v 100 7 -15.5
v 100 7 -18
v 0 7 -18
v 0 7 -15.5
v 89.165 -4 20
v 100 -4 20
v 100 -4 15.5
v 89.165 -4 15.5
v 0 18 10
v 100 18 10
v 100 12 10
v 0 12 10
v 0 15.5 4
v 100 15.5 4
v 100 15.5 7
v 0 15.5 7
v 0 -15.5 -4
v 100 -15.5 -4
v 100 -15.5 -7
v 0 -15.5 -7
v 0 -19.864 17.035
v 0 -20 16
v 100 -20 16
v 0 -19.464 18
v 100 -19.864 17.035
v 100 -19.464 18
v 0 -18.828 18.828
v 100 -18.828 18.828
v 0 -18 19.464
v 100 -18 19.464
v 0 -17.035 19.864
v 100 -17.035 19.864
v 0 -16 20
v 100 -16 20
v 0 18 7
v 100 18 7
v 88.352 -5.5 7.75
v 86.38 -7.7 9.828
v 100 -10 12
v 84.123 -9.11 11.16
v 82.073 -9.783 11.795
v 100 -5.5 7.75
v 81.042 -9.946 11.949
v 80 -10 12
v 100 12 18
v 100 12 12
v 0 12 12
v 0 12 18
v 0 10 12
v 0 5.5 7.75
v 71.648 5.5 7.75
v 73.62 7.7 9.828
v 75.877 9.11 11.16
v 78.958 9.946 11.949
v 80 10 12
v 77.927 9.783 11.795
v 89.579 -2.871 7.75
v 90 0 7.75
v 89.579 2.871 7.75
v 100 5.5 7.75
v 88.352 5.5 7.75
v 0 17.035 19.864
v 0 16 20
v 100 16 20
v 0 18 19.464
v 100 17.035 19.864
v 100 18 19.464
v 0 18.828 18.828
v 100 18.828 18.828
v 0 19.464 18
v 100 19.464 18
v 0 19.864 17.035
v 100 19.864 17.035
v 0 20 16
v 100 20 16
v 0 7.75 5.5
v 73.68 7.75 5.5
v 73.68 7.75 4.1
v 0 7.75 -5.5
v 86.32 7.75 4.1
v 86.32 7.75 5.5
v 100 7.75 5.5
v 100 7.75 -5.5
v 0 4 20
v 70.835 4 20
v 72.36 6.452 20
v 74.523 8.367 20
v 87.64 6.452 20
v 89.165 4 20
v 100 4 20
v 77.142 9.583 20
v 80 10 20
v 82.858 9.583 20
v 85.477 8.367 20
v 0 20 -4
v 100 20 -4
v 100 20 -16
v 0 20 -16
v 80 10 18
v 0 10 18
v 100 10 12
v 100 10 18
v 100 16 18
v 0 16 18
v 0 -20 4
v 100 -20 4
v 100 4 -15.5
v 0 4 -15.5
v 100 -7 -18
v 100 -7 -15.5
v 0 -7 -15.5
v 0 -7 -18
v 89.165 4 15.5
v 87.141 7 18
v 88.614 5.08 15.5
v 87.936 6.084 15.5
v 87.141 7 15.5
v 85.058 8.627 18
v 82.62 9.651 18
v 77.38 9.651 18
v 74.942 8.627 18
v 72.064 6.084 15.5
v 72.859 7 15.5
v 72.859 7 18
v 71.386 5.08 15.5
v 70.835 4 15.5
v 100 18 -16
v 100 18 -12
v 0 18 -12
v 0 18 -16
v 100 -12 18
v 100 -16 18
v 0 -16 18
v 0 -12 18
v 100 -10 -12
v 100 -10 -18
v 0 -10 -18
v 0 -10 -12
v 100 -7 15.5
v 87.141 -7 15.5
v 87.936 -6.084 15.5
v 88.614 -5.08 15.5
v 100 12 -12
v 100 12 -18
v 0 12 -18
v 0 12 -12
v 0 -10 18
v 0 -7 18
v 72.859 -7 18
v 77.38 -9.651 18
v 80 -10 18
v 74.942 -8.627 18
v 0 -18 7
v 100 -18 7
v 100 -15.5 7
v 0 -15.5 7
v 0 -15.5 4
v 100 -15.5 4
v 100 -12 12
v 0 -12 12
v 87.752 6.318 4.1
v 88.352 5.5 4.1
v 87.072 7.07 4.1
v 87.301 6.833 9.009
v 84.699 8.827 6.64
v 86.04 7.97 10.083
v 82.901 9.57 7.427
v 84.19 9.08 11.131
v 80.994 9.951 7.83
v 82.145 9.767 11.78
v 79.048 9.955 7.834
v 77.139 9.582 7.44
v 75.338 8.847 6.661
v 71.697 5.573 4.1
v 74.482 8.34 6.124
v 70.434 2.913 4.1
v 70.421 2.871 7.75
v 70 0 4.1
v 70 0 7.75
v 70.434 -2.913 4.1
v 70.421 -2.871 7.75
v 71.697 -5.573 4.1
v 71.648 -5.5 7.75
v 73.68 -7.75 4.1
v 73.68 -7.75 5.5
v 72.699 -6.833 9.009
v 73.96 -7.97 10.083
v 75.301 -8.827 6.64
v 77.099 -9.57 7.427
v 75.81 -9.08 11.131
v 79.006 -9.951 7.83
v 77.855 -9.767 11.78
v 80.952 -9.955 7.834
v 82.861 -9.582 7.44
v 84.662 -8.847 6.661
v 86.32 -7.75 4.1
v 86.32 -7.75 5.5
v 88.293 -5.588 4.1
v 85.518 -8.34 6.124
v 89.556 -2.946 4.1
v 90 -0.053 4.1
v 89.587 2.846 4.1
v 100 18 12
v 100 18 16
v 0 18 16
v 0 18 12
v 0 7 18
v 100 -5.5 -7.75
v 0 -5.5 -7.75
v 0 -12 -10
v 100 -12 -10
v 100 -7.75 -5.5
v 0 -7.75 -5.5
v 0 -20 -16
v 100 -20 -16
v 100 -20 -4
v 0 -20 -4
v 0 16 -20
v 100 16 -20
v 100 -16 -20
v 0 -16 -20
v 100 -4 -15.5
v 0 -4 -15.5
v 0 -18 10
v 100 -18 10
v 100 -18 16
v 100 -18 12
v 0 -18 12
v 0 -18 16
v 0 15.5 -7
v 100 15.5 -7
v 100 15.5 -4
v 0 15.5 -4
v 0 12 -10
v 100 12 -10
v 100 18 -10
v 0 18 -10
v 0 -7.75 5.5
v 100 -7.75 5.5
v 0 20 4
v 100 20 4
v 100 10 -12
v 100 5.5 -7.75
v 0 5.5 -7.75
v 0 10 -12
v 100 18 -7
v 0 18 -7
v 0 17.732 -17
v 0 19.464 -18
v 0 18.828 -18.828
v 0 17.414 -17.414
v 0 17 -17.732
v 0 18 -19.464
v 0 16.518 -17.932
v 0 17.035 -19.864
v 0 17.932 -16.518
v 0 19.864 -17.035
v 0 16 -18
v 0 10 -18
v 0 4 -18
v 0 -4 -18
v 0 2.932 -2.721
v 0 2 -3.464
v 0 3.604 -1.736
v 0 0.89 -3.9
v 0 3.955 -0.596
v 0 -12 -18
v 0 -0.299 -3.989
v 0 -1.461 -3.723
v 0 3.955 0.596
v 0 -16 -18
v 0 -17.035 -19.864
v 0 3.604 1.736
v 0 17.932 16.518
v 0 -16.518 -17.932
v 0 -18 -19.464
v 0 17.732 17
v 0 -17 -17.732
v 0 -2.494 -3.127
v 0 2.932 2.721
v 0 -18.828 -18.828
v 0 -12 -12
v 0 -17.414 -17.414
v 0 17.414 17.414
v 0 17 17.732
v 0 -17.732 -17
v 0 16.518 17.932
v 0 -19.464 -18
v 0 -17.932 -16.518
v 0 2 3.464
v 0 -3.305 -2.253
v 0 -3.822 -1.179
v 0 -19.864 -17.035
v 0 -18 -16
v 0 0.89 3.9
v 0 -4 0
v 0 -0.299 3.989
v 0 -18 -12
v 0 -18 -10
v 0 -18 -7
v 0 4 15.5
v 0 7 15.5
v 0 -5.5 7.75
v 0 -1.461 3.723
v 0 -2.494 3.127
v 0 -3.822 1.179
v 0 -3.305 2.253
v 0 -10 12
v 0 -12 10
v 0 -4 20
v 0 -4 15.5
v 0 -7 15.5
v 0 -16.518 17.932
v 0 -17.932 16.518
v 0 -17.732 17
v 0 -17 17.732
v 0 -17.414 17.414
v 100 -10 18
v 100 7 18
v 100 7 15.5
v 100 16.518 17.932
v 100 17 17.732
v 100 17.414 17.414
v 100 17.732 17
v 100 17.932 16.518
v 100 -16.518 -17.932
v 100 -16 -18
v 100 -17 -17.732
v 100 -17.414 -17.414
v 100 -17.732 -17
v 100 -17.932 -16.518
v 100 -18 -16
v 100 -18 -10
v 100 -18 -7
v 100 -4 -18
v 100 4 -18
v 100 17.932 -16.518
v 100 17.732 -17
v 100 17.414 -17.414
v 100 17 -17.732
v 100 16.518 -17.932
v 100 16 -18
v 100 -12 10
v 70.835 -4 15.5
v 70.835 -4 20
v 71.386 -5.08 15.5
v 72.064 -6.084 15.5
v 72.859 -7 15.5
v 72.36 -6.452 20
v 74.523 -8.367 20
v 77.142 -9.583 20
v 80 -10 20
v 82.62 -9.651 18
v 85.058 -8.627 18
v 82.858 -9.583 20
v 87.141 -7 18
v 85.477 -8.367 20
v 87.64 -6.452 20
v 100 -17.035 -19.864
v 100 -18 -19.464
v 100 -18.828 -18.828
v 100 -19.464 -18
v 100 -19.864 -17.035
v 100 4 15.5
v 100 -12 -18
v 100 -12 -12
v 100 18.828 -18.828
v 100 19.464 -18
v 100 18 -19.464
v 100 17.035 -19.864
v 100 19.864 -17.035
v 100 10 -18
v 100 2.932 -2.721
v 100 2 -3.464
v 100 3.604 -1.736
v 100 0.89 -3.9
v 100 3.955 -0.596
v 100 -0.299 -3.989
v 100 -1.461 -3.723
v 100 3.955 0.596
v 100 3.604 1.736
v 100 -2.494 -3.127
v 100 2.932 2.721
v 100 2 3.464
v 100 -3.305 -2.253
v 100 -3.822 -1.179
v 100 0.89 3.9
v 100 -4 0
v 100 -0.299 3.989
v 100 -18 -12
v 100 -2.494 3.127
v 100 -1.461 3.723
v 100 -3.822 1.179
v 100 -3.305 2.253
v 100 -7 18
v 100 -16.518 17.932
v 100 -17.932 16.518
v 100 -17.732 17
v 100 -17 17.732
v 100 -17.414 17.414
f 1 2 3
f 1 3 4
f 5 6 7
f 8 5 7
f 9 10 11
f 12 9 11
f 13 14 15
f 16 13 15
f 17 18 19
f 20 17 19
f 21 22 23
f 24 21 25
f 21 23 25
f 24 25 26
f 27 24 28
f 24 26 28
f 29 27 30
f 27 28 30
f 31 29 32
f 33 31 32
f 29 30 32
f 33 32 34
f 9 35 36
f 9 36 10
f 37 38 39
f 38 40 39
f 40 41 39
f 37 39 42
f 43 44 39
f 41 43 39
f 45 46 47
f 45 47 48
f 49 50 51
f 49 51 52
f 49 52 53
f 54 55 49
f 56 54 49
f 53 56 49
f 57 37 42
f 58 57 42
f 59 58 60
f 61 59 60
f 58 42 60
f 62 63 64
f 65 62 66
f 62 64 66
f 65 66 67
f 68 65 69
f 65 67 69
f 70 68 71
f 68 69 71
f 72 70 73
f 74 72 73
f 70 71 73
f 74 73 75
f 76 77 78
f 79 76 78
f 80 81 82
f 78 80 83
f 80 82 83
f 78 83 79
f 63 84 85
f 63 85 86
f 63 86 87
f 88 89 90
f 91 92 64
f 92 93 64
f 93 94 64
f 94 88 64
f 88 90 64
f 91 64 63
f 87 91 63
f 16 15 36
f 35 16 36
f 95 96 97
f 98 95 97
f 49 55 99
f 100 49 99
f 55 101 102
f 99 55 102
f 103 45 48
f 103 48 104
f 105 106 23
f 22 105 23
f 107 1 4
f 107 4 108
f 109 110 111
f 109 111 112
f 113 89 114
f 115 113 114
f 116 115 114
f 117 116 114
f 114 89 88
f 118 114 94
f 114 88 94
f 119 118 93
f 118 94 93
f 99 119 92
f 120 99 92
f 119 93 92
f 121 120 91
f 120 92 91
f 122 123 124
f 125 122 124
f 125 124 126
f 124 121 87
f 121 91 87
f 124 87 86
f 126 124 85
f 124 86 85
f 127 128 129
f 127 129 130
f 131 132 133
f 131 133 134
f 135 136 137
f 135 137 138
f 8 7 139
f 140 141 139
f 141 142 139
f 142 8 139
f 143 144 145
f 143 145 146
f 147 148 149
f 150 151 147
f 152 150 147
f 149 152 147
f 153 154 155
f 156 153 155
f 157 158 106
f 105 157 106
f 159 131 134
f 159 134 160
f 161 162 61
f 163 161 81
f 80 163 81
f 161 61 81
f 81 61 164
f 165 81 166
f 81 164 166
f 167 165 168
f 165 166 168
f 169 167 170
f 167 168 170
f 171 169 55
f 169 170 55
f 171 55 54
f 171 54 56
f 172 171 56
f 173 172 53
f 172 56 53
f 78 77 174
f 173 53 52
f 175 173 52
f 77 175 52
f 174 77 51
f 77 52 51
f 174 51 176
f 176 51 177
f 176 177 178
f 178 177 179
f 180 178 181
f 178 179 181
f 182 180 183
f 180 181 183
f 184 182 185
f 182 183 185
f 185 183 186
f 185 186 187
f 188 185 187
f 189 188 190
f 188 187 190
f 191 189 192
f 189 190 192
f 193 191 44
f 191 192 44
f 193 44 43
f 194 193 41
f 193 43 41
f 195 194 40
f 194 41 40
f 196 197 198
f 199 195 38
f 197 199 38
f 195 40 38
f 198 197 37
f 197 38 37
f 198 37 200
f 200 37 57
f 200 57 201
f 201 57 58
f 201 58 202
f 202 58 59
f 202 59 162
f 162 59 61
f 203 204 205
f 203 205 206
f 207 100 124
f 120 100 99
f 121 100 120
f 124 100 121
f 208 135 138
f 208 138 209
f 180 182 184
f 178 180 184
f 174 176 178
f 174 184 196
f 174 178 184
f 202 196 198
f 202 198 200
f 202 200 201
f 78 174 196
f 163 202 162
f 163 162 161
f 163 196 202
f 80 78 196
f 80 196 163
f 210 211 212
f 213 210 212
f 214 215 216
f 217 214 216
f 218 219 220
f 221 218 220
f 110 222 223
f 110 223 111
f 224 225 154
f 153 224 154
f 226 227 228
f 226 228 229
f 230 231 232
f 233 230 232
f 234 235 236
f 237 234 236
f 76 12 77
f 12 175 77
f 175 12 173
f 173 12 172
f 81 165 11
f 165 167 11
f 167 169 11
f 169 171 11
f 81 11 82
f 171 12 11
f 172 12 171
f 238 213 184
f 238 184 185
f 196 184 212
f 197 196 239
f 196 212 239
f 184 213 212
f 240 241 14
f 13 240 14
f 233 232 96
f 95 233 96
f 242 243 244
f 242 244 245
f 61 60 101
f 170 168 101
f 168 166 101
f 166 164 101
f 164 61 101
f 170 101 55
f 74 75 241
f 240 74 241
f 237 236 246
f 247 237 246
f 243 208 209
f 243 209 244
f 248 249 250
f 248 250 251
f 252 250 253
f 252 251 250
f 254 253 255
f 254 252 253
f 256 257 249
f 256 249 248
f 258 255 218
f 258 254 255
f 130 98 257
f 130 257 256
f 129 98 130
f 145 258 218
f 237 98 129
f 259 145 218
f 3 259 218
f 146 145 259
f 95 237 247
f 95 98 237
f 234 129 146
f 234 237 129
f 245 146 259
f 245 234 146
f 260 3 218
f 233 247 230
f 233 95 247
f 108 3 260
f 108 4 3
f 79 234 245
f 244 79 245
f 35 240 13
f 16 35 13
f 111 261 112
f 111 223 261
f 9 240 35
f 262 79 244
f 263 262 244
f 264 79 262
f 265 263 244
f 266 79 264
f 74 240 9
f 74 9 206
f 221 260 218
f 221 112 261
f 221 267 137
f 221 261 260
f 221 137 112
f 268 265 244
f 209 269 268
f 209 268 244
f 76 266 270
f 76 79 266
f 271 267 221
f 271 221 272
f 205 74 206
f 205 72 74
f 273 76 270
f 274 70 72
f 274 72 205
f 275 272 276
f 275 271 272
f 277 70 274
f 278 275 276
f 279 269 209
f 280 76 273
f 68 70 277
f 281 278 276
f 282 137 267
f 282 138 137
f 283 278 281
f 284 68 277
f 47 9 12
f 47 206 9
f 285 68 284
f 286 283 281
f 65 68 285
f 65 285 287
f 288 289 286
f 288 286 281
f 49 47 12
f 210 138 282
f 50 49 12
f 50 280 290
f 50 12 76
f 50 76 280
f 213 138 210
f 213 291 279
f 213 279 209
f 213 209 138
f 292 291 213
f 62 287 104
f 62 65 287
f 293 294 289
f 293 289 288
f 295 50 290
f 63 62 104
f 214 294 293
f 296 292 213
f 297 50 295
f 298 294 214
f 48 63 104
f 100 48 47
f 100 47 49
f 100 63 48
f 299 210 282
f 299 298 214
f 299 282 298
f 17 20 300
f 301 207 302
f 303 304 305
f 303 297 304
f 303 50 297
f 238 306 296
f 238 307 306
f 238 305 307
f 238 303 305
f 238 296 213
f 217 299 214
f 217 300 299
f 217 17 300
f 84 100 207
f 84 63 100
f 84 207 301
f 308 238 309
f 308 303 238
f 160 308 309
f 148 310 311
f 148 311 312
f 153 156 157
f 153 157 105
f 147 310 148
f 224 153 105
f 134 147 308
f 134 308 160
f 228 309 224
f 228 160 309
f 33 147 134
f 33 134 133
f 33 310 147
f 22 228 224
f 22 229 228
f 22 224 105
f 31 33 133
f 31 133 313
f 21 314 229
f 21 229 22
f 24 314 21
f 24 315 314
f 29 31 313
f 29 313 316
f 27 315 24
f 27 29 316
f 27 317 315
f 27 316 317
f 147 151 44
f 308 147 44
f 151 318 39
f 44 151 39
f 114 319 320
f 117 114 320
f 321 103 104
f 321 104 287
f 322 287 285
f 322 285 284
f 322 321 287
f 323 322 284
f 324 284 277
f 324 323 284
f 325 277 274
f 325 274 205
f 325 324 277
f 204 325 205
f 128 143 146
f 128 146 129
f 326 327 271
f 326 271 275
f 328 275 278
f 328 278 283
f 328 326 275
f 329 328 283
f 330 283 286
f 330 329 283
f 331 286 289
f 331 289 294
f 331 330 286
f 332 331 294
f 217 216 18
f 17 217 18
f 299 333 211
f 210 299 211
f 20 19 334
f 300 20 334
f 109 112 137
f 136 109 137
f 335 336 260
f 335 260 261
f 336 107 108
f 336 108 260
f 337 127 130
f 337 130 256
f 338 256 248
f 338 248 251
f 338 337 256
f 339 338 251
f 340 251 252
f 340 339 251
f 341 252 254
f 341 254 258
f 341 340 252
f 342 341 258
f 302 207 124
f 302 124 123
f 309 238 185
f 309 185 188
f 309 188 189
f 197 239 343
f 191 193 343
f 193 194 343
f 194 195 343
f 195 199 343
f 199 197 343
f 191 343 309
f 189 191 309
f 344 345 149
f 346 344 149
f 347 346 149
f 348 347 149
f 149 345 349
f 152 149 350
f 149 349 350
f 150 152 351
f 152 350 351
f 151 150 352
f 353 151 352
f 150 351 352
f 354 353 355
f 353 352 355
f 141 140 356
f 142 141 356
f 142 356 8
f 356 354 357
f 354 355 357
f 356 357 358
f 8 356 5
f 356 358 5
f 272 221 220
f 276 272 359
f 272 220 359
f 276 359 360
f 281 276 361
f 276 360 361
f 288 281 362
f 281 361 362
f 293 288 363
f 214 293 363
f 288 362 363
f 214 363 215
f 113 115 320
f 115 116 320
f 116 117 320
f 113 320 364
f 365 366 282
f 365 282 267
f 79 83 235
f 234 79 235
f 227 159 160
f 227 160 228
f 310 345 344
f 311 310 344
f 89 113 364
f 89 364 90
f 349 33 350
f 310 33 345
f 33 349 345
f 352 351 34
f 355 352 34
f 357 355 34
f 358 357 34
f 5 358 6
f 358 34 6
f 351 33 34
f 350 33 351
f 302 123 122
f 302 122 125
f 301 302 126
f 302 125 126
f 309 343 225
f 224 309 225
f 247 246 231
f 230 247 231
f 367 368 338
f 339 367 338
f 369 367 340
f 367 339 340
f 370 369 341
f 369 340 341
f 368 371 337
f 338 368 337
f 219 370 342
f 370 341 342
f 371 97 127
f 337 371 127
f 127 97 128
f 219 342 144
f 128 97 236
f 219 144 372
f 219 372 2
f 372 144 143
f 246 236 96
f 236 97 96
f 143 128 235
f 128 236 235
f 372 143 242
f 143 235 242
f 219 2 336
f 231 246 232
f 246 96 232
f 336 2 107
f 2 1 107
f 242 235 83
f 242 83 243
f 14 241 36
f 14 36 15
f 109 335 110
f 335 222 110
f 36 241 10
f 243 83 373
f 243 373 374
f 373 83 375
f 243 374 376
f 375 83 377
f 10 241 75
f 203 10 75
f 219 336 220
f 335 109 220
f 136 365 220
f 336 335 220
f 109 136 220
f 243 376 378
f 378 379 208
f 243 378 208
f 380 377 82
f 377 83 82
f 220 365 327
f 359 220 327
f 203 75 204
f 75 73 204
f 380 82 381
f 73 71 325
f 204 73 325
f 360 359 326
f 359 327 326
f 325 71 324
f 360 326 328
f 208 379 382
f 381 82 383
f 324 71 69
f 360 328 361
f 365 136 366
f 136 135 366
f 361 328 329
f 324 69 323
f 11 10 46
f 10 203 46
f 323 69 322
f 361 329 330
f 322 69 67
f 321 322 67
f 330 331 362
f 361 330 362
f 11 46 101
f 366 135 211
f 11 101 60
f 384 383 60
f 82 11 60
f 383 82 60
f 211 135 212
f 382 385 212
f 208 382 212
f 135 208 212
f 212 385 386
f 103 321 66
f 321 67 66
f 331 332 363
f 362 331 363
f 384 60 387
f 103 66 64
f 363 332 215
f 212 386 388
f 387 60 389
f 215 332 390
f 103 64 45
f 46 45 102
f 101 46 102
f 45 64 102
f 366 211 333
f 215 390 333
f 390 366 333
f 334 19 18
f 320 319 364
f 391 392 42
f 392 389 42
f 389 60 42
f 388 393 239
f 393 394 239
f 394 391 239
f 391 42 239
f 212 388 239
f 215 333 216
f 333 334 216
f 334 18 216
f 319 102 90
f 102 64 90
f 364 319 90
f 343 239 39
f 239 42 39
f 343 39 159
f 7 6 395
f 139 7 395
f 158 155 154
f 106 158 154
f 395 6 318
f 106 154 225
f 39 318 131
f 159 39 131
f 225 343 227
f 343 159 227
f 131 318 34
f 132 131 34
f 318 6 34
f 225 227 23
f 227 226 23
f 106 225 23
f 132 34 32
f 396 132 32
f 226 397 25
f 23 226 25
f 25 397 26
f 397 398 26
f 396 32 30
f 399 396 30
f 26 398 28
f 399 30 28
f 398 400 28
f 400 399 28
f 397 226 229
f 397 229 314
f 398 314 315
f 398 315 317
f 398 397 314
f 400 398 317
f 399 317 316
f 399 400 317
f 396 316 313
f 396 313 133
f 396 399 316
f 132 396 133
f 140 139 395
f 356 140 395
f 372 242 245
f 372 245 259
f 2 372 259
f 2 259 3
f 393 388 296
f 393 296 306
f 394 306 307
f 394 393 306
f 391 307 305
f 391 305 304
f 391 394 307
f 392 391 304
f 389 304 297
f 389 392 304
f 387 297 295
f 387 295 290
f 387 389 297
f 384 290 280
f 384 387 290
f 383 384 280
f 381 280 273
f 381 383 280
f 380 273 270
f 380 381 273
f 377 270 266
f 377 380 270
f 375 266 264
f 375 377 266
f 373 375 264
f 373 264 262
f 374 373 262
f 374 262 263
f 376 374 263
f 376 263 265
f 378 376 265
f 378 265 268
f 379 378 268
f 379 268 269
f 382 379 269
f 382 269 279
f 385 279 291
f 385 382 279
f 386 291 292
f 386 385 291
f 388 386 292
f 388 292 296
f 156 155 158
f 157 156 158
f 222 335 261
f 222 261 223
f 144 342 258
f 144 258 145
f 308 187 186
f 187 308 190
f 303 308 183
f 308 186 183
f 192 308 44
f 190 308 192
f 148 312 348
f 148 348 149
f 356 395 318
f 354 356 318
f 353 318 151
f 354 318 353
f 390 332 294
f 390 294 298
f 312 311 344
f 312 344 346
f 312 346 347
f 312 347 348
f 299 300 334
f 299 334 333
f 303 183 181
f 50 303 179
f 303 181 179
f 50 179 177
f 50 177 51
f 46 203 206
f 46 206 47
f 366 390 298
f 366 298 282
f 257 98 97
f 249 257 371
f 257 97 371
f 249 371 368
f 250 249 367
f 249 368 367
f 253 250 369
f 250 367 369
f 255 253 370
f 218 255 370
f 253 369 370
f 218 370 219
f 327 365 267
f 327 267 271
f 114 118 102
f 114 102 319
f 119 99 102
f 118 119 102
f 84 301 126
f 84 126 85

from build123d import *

# Parameters (mm, degrees)
SKIZZE11_R                     = 4
STRUKTURBAUTEIL1_DEPTH         = 100
SKIZZE2_R                      = 10
SCHNITT_LINEAR_AUSTRAGEN_DEPTH = 15.9


with BuildPart() as part:
    # Skizze11 → Strukturbauteil1 (new body)
    with BuildSketch(Plane(origin=(100, 0, 0), x_dir=(0, -1, 0), z_dir=(-1, 0, 0))):
        with BuildLine():
            Line((16, 20), (4, 20))
            Line((4, 20), (4, 15.5))
            Line((4, 15.5), (7, 15.5))
            Line((7, 15.5), (7, 18))
            Line((7, 18), (10, 18))
            Line((10, 18), (10, 12))
            Line((10, 12), (5.5, 7.75))
            Line((5.5, 7.75), (-5.5, 7.75))
            Line((-5.5, 7.75), (-10, 12))
            Line((-10, 12), (-10, 18))
            Line((-10, 18), (-7, 18))
            Line((-7, 18), (-7, 15.5))
            Line((-7, 15.5), (-4, 15.5))
            Line((-4, 15.5), (-4, 20))
            Line((-4, 20), (-16, 20))
            ThreePointArc((-16, 20), (-18.828427125, 18.828427125), (-20, 16))
            Line((-20, 16), (-20, 4))
            Line((-20, 4), (-15.5, 4))
            Line((-15.5, 4), (-15.5, 7))
            Line((-15.5, 7), (-18, 7))
            Line((-18, 7), (-18, 10))
            Line((-18, 10), (-12, 10))
            Line((-12, 10), (-7.75, 5.5))
            Line((-7.75, 5.5), (-7.75, -5.5))
            Line((-7.75, -5.5), (-12, -10))
            Line((-12, -10), (-18, -10))
            Line((-18, -10), (-18, -7))
            Line((-18, -7), (-15.5, -7))
            Line((-15.5, -7), (-15.5, -4))
            Line((-15.5, -4), (-20, -4))
            Line((-20, -4), (-20, -16))
            ThreePointArc((-20, -16), (-18.828427125, -18.828427125), (-16, -20))
            Line((-16, -20), (16, -20))
            ThreePointArc((16, -20), (18.828427125, -18.828427125), (20, -16))
            Line((20, -16), (20, -4))
            Line((20, -4), (15.5, -4))
            Line((15.5, -4), (15.5, -7))
            Line((15.5, -7), (18, -7))
            Line((18, -7), (18, -10))
            Line((18, -10), (12, -10))
            Line((12, -10), (7.75, -5.5))
            Line((7.75, -5.5), (7.75, 5.5))
            Line((7.75, 5.5), (12, 10))
            Line((12, 10), (18, 10))
            Line((18, 10), (18, 7))
            Line((18, 7), (15.5, 7))
            Line((15.5, 7), (15.5, 4))
            Line((15.5, 4), (20, 4))
            Line((20, 4), (20, 16))
            ThreePointArc((20, 16), (18.828427125, 18.828427125), (16, 20))
        make_face()
        Circle(SKIZZE11_R, mode=Mode.SUBTRACT)
        with BuildLine():
            Line((12, 18), (12, 12))
            Line((12, 12), (18, 12))
            Line((18, 12), (18, 16))
            ThreePointArc((18, 16), (17.414213562, 17.414213562), (16, 18))
            Line((16, 18), (12, 18))
        make_face(mode=Mode.SUBTRACT)
        with BuildLine():
            Line((-18, 12), (-12, 12))
            Line((-12, 12), (-12, 18))
            Line((-12, 18), (-16, 18))
            ThreePointArc((-16, 18), (-17.414213562, 17.414213562), (-18, 16))
            Line((-18, 16), (-18, 12))
        make_face(mode=Mode.SUBTRACT)
        Polygon((-4, -18), (4, -18), (4, -15.5), (7, -15.5), (7, -18), (10, -18), (10, -12), (5.5, -7.75), (-5.5, -7.75), (-10, -12), (-10, -18), (-7, -18), (-7, -15.5), (-4, -15.5), align=None, mode=Mode.SUBTRACT)
        with BuildLine():
            Line((18, -12), (12, -12))
            Line((12, -12), (12, -18))
            Line((12, -18), (16, -18))
            ThreePointArc((16, -18), (17.414213562, -17.414213562), (18, -16))
            Line((18, -16), (18, -12))
        make_face(mode=Mode.SUBTRACT)
        with BuildLine():
            Line((-12, -18), (-12, -12))
            Line((-12, -12), (-18, -12))
            Line((-18, -12), (-18, -16))
            ThreePointArc((-18, -16), (-17.414213562, -17.414213562), (-16, -18))
            Line((-16, -18), (-12, -18))
        make_face(mode=Mode.SUBTRACT)
    extrude(amount=STRUKTURBAUTEIL1_DEPTH)

    # Skizze2 → Schnitt-Linear austragen (cut)
    with BuildSketch(Plane(origin=(60.206991795, 21.446159487, 20), x_dir=(1, 0, 0), z_dir=(0, 0, 1))):
        with Locations(Location((19.793008205, -21.446159487, 0), (0, 0, 33.367012969))):  # turned: the seam where the file's is
            Circle(SKIZZE2_R)
    extrude(amount=-SCHNITT_LINEAR_AUSTRAGEN_DEPTH, mode=Mode.SUBTRACT)


solid = part.part
